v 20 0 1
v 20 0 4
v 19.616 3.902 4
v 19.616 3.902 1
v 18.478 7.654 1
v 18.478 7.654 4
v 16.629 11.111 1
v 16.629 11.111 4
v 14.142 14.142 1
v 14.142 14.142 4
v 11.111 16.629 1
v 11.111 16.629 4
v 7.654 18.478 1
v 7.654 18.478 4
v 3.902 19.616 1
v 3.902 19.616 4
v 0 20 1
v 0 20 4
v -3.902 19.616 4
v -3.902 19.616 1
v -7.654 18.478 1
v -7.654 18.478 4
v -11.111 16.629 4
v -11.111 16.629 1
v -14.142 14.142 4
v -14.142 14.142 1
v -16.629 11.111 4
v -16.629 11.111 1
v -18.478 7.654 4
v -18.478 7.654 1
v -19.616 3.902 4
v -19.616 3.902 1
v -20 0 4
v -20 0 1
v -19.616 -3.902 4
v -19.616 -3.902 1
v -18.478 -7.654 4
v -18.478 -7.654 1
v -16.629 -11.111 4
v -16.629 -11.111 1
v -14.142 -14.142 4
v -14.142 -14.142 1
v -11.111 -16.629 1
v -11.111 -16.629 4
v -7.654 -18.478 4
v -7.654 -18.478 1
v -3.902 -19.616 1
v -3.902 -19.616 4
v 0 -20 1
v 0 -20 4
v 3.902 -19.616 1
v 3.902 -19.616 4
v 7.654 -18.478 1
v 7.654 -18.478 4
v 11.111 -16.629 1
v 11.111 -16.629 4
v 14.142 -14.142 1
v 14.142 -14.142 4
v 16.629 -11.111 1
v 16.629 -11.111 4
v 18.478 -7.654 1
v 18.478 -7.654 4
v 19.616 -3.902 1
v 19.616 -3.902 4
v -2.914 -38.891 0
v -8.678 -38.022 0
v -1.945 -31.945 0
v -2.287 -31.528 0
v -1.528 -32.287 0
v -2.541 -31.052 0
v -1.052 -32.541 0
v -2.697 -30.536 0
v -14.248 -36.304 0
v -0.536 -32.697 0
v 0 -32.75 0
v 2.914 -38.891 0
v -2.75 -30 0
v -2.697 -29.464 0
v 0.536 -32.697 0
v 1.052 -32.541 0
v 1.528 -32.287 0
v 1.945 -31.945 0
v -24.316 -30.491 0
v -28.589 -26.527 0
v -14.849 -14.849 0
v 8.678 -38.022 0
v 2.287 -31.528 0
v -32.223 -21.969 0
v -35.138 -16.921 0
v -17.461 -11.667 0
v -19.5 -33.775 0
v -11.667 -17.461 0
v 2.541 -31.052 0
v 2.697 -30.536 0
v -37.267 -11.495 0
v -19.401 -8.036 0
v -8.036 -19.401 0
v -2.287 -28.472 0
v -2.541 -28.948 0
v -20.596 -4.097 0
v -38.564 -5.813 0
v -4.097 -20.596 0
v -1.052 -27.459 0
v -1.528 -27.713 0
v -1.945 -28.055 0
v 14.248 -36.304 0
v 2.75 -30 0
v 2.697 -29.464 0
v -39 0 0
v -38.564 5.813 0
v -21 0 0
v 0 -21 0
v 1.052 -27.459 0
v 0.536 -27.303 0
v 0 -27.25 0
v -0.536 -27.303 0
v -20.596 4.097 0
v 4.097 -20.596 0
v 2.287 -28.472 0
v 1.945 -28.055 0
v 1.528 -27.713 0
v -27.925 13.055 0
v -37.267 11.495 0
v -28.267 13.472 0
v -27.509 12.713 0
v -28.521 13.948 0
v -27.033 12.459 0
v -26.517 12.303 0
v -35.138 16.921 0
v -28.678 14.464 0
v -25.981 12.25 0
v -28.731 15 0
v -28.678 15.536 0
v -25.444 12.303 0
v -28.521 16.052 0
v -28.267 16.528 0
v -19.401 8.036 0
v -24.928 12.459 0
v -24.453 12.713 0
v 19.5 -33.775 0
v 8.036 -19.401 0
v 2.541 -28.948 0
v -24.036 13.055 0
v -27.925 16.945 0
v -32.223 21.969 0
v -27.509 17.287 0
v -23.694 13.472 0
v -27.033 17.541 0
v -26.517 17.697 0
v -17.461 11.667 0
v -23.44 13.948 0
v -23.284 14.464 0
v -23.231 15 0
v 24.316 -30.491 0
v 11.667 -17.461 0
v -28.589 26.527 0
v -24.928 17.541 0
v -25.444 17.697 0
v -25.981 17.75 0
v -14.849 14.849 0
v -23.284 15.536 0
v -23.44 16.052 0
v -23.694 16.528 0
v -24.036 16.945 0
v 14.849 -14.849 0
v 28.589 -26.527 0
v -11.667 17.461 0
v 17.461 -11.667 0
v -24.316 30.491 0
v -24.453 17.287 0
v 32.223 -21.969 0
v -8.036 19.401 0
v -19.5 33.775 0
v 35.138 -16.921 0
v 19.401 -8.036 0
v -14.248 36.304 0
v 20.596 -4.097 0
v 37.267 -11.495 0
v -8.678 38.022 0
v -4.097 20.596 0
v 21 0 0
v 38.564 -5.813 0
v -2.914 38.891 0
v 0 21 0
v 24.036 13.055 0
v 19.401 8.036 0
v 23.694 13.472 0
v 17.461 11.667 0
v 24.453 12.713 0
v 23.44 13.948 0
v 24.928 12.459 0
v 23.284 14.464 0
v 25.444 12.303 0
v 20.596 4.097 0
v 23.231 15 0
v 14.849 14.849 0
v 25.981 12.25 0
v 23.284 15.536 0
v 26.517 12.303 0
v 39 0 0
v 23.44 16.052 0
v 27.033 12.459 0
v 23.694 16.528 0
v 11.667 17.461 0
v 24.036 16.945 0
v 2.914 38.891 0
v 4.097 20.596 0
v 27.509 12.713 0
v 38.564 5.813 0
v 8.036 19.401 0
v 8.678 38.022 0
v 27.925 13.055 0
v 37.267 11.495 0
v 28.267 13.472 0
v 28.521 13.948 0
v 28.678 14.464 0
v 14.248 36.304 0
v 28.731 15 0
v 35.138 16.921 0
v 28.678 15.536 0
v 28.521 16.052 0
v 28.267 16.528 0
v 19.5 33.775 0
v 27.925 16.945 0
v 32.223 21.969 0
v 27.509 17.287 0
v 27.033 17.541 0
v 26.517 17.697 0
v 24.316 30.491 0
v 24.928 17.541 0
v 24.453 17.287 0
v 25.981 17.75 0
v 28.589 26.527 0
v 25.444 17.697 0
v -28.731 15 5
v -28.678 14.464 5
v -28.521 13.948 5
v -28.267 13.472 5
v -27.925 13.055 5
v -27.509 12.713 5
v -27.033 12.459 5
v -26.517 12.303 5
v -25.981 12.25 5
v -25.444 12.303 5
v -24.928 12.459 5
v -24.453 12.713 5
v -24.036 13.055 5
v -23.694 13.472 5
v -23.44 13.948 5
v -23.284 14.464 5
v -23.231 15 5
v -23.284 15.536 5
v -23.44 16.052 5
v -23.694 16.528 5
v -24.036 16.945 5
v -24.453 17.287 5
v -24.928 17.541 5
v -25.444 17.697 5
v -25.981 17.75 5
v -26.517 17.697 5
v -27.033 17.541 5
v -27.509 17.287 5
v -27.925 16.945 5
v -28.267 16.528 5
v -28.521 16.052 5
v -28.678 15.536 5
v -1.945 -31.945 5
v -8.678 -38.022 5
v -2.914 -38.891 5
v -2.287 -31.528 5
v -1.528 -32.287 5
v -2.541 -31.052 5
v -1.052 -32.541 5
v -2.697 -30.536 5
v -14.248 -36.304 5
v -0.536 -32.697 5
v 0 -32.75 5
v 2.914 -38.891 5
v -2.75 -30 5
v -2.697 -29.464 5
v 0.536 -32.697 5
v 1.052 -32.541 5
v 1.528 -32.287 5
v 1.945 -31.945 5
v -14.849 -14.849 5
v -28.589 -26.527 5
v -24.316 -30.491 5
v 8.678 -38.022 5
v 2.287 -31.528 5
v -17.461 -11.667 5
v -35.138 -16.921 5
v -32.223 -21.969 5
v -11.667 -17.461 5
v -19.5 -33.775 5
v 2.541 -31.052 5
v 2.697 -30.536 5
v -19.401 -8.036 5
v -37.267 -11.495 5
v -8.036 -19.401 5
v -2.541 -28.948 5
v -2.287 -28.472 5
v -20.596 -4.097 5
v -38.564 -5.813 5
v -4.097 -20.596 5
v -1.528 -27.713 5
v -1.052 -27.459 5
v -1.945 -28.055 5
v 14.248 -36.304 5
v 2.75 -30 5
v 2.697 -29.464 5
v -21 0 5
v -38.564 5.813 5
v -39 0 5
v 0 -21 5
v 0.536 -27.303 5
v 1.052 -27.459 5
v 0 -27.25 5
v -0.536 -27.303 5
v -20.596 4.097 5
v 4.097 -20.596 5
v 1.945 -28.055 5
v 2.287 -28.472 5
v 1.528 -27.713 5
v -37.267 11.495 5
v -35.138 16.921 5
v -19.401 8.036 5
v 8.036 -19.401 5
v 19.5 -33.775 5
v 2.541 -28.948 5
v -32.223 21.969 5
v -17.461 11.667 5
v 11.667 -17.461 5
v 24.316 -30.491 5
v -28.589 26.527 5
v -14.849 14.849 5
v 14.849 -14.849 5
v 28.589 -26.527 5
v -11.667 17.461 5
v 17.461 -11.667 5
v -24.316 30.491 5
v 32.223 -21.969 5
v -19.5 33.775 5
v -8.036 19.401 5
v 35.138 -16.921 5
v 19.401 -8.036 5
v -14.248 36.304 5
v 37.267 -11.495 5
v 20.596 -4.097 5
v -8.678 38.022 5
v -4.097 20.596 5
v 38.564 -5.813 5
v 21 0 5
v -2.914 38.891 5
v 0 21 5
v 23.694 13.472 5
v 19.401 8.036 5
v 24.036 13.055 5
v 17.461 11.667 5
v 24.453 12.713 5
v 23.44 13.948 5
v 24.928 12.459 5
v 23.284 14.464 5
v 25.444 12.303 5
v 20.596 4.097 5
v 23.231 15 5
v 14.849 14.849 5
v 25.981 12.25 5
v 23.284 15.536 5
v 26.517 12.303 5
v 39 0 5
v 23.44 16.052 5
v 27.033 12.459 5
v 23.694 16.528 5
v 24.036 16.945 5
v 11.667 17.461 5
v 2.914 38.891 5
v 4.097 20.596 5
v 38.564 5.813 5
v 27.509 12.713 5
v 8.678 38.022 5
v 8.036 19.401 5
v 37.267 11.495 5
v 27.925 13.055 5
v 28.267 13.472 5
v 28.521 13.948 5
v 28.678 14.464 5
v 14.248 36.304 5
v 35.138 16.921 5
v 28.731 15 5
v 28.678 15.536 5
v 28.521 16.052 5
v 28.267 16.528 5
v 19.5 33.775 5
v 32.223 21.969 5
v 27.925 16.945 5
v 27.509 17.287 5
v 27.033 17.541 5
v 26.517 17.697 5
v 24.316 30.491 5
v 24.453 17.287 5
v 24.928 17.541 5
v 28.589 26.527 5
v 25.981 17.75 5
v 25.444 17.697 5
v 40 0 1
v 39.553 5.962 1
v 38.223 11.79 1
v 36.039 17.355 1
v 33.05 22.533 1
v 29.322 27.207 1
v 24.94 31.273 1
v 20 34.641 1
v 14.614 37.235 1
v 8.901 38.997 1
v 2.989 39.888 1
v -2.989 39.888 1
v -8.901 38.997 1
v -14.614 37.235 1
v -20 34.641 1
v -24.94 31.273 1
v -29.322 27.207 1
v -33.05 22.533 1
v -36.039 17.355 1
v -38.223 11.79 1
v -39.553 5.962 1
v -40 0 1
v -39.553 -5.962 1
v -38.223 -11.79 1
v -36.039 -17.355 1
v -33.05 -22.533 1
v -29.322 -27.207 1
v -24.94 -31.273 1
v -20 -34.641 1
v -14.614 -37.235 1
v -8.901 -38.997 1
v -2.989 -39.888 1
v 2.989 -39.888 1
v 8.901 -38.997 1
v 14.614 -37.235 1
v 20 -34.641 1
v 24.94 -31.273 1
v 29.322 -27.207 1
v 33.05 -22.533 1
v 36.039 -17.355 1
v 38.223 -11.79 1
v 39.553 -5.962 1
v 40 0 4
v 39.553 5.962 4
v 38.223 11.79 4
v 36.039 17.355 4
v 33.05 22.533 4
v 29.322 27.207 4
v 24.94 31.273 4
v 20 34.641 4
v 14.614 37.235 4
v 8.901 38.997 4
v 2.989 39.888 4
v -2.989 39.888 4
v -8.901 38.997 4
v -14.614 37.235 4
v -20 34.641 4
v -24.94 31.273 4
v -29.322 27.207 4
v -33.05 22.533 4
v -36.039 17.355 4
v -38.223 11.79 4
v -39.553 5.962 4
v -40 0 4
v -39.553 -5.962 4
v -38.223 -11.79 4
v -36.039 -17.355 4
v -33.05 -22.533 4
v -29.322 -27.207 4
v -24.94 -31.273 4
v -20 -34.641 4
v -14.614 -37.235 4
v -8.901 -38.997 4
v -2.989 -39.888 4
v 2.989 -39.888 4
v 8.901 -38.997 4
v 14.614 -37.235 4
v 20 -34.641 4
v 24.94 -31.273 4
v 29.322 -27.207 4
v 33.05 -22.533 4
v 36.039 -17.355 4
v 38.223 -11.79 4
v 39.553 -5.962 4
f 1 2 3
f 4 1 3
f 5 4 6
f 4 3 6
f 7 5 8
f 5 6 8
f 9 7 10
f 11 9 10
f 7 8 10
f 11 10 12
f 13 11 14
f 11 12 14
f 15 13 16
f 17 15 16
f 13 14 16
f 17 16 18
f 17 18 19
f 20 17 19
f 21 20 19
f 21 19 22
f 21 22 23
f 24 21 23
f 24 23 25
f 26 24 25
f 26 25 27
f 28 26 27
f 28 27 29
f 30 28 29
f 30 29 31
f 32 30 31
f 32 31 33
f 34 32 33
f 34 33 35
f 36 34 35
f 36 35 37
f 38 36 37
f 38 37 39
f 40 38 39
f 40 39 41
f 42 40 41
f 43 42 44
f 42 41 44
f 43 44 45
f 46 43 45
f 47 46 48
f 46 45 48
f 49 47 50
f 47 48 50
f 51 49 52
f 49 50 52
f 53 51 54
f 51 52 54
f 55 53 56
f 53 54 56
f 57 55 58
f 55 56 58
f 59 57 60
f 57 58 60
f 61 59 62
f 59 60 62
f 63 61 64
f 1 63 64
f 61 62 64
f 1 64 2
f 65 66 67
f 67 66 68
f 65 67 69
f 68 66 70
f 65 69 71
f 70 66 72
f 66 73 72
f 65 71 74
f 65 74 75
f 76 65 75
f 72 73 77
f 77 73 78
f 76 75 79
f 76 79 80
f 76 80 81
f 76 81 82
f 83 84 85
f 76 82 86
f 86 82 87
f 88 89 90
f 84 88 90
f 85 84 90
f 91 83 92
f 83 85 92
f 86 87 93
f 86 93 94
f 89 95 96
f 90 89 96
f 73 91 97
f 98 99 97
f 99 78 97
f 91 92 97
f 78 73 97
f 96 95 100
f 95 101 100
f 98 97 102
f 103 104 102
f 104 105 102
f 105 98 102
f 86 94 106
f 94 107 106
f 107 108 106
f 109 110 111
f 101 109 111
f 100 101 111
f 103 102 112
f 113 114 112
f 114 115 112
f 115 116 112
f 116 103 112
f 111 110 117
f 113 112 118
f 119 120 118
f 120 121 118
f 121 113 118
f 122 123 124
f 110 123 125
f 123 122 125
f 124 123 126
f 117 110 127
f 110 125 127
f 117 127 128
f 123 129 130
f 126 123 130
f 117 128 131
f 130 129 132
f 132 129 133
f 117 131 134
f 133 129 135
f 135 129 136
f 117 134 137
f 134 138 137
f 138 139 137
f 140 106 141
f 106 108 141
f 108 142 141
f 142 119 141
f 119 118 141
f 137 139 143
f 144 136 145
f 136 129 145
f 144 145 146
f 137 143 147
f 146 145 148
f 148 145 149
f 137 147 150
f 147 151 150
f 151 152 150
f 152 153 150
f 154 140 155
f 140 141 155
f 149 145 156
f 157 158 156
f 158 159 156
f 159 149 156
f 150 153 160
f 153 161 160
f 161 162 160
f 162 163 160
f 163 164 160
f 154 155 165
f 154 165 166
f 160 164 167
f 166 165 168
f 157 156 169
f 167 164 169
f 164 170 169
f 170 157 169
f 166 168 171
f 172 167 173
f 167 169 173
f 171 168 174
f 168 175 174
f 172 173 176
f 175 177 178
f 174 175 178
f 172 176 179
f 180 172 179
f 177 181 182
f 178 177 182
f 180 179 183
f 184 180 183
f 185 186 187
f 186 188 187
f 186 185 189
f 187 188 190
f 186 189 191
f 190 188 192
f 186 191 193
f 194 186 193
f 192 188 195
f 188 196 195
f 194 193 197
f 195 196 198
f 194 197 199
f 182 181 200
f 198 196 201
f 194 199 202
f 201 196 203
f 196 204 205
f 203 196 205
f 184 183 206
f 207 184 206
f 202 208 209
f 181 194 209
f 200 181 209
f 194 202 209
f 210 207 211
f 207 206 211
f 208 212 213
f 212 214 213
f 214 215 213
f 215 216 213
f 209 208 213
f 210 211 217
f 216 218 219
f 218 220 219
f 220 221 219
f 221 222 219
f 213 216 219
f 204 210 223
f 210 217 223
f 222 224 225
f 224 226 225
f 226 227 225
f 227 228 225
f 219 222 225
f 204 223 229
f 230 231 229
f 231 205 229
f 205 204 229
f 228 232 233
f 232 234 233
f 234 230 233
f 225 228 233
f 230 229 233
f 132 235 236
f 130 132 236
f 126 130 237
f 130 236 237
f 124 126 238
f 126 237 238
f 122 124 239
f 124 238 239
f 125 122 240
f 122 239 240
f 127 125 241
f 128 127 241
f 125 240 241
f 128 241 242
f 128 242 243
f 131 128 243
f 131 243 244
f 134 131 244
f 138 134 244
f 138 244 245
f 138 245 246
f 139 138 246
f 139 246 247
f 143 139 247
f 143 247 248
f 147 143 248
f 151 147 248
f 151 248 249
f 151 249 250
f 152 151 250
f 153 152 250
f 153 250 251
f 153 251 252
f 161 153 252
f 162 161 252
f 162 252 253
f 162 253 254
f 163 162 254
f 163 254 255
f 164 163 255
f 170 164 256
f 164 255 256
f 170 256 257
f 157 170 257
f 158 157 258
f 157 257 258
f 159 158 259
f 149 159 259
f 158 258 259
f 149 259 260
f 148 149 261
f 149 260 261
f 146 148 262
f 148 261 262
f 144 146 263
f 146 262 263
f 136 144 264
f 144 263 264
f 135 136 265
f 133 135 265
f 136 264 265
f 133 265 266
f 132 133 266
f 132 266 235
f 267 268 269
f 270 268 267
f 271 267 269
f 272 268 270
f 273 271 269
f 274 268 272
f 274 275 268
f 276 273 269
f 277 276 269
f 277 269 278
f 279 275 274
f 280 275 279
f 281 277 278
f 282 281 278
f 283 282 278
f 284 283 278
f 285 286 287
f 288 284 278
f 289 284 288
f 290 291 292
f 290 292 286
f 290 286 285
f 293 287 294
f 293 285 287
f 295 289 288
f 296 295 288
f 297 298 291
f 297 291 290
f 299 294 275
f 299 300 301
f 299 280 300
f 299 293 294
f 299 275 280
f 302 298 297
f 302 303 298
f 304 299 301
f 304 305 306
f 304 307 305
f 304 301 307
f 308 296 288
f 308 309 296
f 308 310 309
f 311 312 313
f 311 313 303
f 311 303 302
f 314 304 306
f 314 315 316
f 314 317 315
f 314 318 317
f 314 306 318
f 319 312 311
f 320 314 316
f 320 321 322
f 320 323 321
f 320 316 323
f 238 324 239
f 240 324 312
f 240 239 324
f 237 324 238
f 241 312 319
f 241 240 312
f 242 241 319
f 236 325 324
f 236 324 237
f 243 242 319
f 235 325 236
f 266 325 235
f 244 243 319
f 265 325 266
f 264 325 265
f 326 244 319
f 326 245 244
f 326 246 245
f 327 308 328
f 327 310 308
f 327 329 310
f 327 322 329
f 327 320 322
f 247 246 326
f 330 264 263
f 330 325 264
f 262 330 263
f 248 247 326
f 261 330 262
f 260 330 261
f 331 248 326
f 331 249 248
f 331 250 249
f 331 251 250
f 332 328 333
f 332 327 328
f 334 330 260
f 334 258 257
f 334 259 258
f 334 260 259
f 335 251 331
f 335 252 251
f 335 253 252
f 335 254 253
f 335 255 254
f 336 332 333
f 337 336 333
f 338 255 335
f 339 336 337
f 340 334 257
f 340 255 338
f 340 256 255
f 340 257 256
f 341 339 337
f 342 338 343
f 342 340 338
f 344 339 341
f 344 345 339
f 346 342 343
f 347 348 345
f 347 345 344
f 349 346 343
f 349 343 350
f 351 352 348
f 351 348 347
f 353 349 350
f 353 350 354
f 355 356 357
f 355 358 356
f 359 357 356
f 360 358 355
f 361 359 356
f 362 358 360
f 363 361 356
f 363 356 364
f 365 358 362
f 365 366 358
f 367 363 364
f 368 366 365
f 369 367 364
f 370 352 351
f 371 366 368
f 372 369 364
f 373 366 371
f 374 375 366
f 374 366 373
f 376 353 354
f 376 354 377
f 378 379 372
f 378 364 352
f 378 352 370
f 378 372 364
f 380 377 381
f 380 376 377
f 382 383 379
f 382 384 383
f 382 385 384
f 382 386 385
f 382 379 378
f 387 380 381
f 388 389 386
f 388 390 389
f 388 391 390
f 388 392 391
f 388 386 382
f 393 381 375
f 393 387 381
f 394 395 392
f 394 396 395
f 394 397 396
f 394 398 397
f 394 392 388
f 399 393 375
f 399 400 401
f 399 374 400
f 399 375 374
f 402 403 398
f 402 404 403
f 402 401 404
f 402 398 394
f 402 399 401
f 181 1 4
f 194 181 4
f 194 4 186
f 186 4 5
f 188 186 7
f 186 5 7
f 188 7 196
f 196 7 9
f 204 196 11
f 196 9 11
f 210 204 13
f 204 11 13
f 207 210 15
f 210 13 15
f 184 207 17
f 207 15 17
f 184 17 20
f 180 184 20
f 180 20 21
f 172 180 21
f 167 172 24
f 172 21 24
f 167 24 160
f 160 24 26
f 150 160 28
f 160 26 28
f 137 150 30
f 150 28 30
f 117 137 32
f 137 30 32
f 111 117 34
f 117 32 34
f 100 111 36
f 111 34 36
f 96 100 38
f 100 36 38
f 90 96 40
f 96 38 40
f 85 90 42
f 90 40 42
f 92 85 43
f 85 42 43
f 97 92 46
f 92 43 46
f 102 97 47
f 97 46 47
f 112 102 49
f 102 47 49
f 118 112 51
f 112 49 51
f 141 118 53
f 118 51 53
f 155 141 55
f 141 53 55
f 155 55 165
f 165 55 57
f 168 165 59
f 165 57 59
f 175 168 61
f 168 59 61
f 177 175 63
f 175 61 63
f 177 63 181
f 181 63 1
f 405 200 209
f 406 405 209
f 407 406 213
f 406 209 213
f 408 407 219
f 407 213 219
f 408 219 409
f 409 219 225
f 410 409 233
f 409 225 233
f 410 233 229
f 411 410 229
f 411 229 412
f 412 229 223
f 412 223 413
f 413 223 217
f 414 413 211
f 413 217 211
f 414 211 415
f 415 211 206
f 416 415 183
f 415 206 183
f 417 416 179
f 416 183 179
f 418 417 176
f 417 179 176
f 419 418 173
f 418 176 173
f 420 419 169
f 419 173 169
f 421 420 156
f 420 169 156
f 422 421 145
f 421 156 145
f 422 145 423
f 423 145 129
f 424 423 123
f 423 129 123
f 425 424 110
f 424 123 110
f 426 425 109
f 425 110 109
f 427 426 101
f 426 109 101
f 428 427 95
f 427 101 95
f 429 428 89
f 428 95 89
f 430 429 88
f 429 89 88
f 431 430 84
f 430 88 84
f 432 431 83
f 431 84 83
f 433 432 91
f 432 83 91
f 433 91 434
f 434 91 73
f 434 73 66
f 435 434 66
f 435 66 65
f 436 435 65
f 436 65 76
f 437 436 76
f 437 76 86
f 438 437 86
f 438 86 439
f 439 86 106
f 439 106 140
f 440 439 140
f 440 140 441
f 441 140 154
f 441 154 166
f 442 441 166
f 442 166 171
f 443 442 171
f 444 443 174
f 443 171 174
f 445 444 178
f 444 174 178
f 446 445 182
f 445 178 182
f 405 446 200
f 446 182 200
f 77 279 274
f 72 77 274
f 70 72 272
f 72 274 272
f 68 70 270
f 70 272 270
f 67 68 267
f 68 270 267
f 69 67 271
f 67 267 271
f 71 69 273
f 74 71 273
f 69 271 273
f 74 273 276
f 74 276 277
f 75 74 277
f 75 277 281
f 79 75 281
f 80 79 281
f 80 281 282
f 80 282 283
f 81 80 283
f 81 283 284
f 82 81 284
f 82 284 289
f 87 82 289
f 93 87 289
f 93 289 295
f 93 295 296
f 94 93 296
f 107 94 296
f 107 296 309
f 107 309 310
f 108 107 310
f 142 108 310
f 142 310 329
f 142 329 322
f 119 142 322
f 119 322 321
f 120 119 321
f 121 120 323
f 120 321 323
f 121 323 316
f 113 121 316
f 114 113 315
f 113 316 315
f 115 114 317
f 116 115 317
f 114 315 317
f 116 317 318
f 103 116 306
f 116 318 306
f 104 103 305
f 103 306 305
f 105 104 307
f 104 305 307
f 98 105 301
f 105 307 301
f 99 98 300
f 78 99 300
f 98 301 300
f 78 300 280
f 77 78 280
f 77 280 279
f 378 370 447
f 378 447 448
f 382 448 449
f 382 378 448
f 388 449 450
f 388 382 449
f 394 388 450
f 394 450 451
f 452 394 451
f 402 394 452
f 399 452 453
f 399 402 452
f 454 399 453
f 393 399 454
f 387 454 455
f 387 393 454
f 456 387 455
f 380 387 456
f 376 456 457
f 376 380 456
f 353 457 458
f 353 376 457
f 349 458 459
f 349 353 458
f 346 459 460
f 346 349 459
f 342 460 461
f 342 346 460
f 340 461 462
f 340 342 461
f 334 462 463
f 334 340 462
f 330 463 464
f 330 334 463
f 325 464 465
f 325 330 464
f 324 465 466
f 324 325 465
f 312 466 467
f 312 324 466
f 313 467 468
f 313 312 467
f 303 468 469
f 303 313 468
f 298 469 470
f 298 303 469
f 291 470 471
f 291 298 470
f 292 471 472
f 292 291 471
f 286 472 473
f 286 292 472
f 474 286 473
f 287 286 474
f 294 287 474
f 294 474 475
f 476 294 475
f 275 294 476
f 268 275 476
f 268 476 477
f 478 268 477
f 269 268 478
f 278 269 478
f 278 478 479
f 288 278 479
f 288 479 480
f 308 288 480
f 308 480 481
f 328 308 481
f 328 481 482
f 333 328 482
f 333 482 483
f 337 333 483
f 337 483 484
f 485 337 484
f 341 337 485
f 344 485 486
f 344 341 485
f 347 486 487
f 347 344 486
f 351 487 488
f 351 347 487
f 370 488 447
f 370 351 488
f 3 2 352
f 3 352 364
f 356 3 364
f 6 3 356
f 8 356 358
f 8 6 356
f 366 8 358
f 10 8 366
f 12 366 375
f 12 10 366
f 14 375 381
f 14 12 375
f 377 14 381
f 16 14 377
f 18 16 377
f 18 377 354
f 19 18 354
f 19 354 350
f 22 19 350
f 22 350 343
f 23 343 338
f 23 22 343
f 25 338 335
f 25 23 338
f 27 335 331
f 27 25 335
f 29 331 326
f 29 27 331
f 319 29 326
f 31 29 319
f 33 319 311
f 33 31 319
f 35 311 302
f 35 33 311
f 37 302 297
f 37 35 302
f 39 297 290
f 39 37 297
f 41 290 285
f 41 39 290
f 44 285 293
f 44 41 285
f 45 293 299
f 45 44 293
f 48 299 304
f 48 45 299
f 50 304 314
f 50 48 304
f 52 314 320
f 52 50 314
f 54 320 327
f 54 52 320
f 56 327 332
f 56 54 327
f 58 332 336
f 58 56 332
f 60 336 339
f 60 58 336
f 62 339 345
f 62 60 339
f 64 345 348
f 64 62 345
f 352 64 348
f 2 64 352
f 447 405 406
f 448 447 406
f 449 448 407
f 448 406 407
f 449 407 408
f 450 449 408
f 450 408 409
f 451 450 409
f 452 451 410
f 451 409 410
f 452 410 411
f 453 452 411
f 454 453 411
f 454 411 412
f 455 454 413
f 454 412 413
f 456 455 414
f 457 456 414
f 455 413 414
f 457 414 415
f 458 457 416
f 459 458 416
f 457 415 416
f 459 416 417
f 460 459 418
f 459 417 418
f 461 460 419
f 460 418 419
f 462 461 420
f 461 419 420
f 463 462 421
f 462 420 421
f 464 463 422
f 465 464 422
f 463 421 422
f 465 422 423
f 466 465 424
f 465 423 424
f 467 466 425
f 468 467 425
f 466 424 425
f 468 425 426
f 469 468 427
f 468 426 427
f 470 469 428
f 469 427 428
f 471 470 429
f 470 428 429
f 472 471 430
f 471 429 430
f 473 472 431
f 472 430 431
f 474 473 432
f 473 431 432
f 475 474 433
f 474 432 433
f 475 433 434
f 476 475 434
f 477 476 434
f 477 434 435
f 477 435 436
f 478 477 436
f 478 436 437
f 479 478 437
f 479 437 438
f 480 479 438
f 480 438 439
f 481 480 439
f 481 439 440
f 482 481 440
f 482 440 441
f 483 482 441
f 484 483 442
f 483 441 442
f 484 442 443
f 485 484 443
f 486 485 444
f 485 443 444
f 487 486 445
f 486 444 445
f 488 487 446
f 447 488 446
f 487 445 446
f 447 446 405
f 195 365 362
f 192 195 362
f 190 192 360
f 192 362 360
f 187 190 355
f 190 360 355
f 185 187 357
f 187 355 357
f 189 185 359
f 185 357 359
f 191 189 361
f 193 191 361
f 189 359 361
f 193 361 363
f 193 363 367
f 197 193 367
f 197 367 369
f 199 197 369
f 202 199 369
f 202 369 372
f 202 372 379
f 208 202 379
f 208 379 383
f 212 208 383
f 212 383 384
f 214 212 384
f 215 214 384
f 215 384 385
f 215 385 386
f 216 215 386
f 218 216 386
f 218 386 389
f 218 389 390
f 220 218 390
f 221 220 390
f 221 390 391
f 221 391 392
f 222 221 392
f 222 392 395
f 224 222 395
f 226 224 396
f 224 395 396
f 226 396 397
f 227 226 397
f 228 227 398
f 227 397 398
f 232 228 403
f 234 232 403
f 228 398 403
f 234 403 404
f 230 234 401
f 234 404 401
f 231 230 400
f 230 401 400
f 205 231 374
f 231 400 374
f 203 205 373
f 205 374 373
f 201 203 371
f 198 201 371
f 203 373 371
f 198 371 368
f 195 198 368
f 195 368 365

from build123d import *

# Parameters (mm, degrees)
F0_R     = 40
F1_DEPTH = 5
F3_D     = 5.5
F4_R     = 20
F5_DEPTH = 5.001
F6_SIZE  = 1


with BuildPart() as f1:
    # F0 (on Top) → F1 (new body)
    with BuildSketch(Plane.XY):
        Circle(F0_R)
    extrude(amount=F1_DEPTH)

    # F3 (through all)
    with Locations(Plane(origin=(0, 0, 0), x_dir=(1, 0, 0), z_dir=(0, 0, -1))):
        with Locations((0, 30), (25.980762, -15), (-25.980762, -15)):
            Hole(F3_D / 2)

    # F4 (on face) → F5 (cut, through all)
    with BuildSketch(Plane.XY.offset(5)):
        Circle(F4_R)
    extrude(amount=-F5_DEPTH, mode=Mode.SUBTRACT)

    # F6
    f6_edges = [f1.edges().sort_by_distance(p)[0] for p in [
        (-40, 0, 5),
        (-40, 0, 0),
        (-20, 0, 5),
        (-20, 0, 0),
    ]]
    chamfer(f6_edges, length=F6_SIZE)


solid = f1.part
